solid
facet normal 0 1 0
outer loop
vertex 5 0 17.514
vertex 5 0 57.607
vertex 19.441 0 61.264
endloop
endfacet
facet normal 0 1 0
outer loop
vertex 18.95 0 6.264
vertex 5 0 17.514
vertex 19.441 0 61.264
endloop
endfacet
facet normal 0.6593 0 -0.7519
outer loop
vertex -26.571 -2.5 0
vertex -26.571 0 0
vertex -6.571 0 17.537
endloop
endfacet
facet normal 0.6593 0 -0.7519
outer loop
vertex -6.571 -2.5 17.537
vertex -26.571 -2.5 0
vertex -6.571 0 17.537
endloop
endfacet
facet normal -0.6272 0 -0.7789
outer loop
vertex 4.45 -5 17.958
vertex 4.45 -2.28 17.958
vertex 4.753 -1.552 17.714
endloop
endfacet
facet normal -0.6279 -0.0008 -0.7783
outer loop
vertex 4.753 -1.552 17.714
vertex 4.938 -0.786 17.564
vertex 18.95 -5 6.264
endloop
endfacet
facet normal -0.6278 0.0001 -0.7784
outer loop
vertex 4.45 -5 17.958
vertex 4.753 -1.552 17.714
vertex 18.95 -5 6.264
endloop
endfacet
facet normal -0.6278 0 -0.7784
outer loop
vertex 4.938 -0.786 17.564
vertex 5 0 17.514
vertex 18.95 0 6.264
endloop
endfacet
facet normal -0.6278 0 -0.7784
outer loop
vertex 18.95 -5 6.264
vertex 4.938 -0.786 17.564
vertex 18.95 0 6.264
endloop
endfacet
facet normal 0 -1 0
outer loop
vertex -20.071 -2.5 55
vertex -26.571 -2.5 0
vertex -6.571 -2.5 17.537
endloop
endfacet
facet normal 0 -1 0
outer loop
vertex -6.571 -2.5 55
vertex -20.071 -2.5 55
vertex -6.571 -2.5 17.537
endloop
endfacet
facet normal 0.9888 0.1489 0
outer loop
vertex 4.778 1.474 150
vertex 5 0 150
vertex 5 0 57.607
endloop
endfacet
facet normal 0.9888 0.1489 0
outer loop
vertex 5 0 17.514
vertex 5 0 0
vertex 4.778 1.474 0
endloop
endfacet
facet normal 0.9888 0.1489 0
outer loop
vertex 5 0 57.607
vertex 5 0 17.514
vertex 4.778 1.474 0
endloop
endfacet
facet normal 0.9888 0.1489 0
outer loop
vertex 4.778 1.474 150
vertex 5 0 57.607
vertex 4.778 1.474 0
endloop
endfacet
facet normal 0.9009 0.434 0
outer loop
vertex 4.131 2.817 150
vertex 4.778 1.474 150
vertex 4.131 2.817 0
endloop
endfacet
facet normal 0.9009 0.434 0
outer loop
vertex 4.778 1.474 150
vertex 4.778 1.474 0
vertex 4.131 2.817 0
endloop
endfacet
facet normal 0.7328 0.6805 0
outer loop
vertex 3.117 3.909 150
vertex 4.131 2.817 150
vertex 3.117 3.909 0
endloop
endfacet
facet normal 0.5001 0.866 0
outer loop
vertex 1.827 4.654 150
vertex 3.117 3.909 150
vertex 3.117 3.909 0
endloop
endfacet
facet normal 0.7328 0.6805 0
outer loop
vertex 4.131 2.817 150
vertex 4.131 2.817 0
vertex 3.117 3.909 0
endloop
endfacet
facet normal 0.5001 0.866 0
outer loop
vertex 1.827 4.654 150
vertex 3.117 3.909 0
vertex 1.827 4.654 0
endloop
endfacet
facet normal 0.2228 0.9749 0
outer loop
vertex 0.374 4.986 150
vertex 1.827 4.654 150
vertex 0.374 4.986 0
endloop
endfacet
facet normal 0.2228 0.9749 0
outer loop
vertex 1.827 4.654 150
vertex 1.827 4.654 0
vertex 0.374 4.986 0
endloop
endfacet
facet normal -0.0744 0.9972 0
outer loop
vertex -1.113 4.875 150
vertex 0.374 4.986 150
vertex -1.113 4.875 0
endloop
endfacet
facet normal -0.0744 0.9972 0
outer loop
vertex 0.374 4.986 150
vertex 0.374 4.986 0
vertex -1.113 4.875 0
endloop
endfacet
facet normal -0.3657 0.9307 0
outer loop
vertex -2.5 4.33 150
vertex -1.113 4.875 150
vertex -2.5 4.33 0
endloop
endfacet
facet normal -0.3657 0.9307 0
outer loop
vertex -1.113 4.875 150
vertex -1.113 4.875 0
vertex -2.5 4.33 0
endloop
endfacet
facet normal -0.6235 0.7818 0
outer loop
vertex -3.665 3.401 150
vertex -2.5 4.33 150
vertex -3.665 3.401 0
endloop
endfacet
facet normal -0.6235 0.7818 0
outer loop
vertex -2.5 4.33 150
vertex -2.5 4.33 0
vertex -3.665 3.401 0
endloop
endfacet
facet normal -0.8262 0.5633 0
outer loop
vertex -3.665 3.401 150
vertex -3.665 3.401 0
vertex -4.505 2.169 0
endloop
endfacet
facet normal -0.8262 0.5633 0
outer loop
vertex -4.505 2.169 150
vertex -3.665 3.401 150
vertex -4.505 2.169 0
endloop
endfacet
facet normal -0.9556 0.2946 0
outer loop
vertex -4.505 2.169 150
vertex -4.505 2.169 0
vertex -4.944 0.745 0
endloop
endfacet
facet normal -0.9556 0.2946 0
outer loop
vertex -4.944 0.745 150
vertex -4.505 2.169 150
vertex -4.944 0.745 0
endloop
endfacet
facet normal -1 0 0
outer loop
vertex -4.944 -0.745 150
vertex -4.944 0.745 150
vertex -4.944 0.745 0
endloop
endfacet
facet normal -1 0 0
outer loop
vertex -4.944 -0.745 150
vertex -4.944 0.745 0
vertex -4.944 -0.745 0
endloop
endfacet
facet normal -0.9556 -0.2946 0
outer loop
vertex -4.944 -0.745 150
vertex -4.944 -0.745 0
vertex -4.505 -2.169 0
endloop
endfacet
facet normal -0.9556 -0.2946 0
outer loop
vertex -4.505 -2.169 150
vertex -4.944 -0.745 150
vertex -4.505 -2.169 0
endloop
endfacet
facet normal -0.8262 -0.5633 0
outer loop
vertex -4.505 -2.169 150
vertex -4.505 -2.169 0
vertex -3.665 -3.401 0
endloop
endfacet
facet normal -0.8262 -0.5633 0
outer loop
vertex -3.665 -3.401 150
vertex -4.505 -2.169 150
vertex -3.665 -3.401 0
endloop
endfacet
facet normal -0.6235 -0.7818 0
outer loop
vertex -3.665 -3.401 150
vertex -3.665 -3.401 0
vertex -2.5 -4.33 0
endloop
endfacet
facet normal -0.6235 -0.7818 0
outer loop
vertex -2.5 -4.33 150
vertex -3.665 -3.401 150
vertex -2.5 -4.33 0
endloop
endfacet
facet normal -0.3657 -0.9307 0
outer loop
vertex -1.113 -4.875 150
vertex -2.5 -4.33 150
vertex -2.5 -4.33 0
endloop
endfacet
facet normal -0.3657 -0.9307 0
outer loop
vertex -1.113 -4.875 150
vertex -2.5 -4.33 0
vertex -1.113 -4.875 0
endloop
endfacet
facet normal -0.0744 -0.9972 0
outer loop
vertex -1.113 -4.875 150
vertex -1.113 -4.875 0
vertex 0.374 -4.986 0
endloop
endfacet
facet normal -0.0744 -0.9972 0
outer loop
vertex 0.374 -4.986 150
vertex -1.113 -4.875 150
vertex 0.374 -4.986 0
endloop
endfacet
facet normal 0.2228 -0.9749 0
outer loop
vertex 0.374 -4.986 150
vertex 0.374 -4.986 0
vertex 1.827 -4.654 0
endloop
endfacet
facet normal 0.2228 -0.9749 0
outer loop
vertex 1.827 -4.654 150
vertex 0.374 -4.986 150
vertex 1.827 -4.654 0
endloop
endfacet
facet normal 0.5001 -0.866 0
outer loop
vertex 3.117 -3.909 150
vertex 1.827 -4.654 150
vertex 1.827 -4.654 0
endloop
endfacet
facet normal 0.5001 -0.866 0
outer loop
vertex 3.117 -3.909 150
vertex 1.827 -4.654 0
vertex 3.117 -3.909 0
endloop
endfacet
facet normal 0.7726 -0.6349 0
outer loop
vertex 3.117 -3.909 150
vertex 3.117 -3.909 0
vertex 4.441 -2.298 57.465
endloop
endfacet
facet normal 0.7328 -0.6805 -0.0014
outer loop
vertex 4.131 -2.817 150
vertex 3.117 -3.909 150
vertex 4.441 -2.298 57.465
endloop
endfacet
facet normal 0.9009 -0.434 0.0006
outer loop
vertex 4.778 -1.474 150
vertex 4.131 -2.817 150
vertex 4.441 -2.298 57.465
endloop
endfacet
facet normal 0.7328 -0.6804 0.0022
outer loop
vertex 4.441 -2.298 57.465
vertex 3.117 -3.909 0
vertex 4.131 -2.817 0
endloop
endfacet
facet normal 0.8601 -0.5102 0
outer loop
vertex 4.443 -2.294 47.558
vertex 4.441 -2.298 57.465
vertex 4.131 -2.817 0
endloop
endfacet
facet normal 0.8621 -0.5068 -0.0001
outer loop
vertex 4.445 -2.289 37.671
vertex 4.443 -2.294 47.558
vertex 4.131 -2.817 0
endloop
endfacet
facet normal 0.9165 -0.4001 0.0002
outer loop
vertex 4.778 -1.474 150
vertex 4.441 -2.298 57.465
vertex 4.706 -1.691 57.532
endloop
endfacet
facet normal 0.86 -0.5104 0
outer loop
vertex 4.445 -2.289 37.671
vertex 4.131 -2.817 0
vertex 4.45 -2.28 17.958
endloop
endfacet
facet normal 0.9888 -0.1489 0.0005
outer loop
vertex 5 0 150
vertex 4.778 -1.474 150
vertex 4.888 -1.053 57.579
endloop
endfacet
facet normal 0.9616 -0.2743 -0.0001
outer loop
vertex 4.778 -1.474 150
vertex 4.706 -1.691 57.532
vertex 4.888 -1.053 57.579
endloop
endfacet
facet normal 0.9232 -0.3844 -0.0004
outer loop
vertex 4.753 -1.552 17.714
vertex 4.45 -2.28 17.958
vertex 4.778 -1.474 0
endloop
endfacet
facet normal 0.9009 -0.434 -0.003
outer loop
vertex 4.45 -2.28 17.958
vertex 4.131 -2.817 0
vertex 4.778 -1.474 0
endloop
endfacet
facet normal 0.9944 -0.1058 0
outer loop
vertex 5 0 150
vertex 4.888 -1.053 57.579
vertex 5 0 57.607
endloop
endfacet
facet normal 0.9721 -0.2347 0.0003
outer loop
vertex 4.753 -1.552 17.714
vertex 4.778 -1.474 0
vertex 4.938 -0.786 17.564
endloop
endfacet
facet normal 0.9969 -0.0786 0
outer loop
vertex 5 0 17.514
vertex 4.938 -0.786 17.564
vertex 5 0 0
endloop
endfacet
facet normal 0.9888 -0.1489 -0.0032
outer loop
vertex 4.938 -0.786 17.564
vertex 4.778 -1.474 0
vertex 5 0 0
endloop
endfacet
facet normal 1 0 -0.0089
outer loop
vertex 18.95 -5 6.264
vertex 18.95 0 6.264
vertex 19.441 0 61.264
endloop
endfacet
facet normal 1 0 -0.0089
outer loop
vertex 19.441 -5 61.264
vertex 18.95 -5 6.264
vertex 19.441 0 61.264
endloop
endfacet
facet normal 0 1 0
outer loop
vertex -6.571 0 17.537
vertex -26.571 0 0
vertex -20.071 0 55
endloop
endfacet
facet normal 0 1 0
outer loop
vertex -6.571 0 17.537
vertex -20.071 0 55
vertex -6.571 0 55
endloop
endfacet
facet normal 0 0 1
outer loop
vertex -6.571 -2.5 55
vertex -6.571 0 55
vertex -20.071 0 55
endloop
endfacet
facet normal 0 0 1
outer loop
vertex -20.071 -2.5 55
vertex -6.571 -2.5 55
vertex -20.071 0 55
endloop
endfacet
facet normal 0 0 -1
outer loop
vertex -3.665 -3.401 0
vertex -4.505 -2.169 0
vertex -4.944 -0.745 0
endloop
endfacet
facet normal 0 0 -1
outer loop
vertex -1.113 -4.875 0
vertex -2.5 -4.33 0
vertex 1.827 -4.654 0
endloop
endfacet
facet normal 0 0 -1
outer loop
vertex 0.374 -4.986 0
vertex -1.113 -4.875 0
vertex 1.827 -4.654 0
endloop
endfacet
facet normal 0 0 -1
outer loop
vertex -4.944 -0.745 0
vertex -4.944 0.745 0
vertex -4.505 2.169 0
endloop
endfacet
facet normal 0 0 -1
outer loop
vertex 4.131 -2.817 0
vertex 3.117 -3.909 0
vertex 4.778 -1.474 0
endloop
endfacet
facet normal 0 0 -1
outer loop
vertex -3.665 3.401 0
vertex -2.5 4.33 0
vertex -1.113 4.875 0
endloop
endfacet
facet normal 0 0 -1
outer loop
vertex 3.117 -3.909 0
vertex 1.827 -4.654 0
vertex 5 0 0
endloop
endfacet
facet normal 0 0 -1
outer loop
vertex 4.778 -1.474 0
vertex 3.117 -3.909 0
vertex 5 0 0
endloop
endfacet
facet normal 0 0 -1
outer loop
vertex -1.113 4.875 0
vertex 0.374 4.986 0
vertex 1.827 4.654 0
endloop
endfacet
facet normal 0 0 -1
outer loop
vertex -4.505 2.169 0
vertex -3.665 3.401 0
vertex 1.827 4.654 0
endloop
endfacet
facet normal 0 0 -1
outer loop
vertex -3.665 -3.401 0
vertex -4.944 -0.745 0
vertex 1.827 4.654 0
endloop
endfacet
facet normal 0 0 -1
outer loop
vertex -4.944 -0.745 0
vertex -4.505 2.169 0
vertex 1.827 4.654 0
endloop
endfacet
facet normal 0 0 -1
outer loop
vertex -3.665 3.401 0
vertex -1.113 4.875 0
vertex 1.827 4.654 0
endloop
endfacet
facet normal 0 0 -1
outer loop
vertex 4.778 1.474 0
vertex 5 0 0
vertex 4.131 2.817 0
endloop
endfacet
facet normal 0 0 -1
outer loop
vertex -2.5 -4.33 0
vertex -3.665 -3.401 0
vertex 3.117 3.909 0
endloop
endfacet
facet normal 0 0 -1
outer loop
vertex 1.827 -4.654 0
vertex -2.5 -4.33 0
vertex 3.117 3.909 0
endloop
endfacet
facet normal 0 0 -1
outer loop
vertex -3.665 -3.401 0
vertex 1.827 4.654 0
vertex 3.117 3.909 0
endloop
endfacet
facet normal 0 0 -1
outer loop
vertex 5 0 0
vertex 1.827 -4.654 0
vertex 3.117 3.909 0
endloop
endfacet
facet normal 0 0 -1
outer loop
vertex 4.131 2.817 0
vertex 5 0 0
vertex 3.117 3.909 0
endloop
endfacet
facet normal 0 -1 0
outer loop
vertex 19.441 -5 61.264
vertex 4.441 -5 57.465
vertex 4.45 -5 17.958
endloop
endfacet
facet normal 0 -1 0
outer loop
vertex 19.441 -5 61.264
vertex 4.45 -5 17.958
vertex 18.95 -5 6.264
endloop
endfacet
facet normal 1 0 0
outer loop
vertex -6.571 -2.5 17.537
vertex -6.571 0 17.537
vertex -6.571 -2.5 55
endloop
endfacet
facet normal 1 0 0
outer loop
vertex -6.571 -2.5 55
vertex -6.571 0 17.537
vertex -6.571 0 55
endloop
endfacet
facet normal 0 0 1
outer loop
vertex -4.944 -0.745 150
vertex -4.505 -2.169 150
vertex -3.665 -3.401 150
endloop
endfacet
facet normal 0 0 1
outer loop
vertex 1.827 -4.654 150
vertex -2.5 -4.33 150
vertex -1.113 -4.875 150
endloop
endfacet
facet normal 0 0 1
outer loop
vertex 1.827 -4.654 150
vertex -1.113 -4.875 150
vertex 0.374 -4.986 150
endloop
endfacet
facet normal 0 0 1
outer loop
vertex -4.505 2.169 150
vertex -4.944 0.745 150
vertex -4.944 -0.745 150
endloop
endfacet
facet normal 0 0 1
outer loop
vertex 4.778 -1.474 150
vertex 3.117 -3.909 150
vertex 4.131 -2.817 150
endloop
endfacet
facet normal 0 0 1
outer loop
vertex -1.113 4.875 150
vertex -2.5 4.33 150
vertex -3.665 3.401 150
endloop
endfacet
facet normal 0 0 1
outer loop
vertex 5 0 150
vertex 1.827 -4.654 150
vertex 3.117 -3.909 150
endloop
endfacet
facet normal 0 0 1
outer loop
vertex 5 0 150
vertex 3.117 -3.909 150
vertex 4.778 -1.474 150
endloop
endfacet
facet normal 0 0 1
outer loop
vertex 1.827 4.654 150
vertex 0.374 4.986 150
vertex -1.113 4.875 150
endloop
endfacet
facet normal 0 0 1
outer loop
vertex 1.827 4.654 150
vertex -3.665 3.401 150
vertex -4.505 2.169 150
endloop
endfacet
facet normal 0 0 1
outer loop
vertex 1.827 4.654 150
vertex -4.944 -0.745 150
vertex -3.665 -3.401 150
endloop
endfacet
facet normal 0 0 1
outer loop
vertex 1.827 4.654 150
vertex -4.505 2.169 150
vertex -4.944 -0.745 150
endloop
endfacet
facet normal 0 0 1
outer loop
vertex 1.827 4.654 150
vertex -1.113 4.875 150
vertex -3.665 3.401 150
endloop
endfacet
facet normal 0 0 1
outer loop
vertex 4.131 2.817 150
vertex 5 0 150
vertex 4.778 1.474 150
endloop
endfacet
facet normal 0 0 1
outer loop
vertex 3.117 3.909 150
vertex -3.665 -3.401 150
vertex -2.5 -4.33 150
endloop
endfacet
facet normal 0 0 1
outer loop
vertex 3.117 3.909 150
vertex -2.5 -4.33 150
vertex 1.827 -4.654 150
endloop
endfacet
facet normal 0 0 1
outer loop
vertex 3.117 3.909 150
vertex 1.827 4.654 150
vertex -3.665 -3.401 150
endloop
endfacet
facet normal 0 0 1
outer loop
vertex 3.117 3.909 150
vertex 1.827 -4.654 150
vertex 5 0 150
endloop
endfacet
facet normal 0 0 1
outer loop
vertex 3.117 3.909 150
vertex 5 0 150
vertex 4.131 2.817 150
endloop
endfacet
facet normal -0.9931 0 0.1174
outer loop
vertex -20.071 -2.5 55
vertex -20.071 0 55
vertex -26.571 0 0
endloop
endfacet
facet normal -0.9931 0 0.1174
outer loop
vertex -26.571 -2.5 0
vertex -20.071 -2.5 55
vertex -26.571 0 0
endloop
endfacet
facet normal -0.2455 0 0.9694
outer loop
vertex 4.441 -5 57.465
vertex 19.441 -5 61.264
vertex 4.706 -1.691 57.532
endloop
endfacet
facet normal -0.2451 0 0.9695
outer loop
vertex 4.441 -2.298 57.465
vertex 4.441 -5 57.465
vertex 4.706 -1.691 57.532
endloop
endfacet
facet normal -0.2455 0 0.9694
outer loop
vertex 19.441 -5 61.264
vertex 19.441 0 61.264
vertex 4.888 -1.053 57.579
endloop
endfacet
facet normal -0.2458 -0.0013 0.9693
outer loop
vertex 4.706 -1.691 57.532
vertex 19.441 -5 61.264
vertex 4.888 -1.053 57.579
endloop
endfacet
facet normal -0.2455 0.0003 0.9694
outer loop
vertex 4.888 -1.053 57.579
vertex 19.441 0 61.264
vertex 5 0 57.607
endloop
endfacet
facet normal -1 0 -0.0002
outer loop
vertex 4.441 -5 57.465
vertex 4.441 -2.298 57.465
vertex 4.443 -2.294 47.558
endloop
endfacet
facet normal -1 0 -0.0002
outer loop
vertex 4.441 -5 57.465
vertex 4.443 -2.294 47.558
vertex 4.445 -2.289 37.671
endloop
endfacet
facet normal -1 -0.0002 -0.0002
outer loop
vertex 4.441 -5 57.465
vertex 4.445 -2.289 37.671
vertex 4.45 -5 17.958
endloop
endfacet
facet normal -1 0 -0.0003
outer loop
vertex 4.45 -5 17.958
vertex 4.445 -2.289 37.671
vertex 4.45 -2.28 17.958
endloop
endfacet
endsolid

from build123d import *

# Parameters (mm, degrees)
F0_R     = 5
F1_DEPTH = 150
F3_DEPTH = 2.5
F5_DEPTH = 5


with BuildPart() as f1:
    # F0 (on Top) → F1 (new body)
    with BuildSketch(Plane.XY):
        Circle(F0_R)
    extrude(amount=F1_DEPTH)

    # F4 (on Front) → F5 (join)
    with BuildSketch(Plane.XZ):
        Polygon((19.440542, 61.264036), (4.440542, 57.465279), (4.45015, 17.957808), (18.95015, 6.264036), align=None)
    extrude(amount=F5_DEPTH)


with BuildPart() as f3:
    # F2 (on Front) → F3 (new body)
    with BuildSketch(Plane.XZ):
        Polygon((-6.571087, 17.536635), (-6.571087, 55), (-20.071087, 55), (-26.571087, 0), align=None)
    extrude(amount=F3_DEPTH)


solid = Compound([f1.part, f3.part])
